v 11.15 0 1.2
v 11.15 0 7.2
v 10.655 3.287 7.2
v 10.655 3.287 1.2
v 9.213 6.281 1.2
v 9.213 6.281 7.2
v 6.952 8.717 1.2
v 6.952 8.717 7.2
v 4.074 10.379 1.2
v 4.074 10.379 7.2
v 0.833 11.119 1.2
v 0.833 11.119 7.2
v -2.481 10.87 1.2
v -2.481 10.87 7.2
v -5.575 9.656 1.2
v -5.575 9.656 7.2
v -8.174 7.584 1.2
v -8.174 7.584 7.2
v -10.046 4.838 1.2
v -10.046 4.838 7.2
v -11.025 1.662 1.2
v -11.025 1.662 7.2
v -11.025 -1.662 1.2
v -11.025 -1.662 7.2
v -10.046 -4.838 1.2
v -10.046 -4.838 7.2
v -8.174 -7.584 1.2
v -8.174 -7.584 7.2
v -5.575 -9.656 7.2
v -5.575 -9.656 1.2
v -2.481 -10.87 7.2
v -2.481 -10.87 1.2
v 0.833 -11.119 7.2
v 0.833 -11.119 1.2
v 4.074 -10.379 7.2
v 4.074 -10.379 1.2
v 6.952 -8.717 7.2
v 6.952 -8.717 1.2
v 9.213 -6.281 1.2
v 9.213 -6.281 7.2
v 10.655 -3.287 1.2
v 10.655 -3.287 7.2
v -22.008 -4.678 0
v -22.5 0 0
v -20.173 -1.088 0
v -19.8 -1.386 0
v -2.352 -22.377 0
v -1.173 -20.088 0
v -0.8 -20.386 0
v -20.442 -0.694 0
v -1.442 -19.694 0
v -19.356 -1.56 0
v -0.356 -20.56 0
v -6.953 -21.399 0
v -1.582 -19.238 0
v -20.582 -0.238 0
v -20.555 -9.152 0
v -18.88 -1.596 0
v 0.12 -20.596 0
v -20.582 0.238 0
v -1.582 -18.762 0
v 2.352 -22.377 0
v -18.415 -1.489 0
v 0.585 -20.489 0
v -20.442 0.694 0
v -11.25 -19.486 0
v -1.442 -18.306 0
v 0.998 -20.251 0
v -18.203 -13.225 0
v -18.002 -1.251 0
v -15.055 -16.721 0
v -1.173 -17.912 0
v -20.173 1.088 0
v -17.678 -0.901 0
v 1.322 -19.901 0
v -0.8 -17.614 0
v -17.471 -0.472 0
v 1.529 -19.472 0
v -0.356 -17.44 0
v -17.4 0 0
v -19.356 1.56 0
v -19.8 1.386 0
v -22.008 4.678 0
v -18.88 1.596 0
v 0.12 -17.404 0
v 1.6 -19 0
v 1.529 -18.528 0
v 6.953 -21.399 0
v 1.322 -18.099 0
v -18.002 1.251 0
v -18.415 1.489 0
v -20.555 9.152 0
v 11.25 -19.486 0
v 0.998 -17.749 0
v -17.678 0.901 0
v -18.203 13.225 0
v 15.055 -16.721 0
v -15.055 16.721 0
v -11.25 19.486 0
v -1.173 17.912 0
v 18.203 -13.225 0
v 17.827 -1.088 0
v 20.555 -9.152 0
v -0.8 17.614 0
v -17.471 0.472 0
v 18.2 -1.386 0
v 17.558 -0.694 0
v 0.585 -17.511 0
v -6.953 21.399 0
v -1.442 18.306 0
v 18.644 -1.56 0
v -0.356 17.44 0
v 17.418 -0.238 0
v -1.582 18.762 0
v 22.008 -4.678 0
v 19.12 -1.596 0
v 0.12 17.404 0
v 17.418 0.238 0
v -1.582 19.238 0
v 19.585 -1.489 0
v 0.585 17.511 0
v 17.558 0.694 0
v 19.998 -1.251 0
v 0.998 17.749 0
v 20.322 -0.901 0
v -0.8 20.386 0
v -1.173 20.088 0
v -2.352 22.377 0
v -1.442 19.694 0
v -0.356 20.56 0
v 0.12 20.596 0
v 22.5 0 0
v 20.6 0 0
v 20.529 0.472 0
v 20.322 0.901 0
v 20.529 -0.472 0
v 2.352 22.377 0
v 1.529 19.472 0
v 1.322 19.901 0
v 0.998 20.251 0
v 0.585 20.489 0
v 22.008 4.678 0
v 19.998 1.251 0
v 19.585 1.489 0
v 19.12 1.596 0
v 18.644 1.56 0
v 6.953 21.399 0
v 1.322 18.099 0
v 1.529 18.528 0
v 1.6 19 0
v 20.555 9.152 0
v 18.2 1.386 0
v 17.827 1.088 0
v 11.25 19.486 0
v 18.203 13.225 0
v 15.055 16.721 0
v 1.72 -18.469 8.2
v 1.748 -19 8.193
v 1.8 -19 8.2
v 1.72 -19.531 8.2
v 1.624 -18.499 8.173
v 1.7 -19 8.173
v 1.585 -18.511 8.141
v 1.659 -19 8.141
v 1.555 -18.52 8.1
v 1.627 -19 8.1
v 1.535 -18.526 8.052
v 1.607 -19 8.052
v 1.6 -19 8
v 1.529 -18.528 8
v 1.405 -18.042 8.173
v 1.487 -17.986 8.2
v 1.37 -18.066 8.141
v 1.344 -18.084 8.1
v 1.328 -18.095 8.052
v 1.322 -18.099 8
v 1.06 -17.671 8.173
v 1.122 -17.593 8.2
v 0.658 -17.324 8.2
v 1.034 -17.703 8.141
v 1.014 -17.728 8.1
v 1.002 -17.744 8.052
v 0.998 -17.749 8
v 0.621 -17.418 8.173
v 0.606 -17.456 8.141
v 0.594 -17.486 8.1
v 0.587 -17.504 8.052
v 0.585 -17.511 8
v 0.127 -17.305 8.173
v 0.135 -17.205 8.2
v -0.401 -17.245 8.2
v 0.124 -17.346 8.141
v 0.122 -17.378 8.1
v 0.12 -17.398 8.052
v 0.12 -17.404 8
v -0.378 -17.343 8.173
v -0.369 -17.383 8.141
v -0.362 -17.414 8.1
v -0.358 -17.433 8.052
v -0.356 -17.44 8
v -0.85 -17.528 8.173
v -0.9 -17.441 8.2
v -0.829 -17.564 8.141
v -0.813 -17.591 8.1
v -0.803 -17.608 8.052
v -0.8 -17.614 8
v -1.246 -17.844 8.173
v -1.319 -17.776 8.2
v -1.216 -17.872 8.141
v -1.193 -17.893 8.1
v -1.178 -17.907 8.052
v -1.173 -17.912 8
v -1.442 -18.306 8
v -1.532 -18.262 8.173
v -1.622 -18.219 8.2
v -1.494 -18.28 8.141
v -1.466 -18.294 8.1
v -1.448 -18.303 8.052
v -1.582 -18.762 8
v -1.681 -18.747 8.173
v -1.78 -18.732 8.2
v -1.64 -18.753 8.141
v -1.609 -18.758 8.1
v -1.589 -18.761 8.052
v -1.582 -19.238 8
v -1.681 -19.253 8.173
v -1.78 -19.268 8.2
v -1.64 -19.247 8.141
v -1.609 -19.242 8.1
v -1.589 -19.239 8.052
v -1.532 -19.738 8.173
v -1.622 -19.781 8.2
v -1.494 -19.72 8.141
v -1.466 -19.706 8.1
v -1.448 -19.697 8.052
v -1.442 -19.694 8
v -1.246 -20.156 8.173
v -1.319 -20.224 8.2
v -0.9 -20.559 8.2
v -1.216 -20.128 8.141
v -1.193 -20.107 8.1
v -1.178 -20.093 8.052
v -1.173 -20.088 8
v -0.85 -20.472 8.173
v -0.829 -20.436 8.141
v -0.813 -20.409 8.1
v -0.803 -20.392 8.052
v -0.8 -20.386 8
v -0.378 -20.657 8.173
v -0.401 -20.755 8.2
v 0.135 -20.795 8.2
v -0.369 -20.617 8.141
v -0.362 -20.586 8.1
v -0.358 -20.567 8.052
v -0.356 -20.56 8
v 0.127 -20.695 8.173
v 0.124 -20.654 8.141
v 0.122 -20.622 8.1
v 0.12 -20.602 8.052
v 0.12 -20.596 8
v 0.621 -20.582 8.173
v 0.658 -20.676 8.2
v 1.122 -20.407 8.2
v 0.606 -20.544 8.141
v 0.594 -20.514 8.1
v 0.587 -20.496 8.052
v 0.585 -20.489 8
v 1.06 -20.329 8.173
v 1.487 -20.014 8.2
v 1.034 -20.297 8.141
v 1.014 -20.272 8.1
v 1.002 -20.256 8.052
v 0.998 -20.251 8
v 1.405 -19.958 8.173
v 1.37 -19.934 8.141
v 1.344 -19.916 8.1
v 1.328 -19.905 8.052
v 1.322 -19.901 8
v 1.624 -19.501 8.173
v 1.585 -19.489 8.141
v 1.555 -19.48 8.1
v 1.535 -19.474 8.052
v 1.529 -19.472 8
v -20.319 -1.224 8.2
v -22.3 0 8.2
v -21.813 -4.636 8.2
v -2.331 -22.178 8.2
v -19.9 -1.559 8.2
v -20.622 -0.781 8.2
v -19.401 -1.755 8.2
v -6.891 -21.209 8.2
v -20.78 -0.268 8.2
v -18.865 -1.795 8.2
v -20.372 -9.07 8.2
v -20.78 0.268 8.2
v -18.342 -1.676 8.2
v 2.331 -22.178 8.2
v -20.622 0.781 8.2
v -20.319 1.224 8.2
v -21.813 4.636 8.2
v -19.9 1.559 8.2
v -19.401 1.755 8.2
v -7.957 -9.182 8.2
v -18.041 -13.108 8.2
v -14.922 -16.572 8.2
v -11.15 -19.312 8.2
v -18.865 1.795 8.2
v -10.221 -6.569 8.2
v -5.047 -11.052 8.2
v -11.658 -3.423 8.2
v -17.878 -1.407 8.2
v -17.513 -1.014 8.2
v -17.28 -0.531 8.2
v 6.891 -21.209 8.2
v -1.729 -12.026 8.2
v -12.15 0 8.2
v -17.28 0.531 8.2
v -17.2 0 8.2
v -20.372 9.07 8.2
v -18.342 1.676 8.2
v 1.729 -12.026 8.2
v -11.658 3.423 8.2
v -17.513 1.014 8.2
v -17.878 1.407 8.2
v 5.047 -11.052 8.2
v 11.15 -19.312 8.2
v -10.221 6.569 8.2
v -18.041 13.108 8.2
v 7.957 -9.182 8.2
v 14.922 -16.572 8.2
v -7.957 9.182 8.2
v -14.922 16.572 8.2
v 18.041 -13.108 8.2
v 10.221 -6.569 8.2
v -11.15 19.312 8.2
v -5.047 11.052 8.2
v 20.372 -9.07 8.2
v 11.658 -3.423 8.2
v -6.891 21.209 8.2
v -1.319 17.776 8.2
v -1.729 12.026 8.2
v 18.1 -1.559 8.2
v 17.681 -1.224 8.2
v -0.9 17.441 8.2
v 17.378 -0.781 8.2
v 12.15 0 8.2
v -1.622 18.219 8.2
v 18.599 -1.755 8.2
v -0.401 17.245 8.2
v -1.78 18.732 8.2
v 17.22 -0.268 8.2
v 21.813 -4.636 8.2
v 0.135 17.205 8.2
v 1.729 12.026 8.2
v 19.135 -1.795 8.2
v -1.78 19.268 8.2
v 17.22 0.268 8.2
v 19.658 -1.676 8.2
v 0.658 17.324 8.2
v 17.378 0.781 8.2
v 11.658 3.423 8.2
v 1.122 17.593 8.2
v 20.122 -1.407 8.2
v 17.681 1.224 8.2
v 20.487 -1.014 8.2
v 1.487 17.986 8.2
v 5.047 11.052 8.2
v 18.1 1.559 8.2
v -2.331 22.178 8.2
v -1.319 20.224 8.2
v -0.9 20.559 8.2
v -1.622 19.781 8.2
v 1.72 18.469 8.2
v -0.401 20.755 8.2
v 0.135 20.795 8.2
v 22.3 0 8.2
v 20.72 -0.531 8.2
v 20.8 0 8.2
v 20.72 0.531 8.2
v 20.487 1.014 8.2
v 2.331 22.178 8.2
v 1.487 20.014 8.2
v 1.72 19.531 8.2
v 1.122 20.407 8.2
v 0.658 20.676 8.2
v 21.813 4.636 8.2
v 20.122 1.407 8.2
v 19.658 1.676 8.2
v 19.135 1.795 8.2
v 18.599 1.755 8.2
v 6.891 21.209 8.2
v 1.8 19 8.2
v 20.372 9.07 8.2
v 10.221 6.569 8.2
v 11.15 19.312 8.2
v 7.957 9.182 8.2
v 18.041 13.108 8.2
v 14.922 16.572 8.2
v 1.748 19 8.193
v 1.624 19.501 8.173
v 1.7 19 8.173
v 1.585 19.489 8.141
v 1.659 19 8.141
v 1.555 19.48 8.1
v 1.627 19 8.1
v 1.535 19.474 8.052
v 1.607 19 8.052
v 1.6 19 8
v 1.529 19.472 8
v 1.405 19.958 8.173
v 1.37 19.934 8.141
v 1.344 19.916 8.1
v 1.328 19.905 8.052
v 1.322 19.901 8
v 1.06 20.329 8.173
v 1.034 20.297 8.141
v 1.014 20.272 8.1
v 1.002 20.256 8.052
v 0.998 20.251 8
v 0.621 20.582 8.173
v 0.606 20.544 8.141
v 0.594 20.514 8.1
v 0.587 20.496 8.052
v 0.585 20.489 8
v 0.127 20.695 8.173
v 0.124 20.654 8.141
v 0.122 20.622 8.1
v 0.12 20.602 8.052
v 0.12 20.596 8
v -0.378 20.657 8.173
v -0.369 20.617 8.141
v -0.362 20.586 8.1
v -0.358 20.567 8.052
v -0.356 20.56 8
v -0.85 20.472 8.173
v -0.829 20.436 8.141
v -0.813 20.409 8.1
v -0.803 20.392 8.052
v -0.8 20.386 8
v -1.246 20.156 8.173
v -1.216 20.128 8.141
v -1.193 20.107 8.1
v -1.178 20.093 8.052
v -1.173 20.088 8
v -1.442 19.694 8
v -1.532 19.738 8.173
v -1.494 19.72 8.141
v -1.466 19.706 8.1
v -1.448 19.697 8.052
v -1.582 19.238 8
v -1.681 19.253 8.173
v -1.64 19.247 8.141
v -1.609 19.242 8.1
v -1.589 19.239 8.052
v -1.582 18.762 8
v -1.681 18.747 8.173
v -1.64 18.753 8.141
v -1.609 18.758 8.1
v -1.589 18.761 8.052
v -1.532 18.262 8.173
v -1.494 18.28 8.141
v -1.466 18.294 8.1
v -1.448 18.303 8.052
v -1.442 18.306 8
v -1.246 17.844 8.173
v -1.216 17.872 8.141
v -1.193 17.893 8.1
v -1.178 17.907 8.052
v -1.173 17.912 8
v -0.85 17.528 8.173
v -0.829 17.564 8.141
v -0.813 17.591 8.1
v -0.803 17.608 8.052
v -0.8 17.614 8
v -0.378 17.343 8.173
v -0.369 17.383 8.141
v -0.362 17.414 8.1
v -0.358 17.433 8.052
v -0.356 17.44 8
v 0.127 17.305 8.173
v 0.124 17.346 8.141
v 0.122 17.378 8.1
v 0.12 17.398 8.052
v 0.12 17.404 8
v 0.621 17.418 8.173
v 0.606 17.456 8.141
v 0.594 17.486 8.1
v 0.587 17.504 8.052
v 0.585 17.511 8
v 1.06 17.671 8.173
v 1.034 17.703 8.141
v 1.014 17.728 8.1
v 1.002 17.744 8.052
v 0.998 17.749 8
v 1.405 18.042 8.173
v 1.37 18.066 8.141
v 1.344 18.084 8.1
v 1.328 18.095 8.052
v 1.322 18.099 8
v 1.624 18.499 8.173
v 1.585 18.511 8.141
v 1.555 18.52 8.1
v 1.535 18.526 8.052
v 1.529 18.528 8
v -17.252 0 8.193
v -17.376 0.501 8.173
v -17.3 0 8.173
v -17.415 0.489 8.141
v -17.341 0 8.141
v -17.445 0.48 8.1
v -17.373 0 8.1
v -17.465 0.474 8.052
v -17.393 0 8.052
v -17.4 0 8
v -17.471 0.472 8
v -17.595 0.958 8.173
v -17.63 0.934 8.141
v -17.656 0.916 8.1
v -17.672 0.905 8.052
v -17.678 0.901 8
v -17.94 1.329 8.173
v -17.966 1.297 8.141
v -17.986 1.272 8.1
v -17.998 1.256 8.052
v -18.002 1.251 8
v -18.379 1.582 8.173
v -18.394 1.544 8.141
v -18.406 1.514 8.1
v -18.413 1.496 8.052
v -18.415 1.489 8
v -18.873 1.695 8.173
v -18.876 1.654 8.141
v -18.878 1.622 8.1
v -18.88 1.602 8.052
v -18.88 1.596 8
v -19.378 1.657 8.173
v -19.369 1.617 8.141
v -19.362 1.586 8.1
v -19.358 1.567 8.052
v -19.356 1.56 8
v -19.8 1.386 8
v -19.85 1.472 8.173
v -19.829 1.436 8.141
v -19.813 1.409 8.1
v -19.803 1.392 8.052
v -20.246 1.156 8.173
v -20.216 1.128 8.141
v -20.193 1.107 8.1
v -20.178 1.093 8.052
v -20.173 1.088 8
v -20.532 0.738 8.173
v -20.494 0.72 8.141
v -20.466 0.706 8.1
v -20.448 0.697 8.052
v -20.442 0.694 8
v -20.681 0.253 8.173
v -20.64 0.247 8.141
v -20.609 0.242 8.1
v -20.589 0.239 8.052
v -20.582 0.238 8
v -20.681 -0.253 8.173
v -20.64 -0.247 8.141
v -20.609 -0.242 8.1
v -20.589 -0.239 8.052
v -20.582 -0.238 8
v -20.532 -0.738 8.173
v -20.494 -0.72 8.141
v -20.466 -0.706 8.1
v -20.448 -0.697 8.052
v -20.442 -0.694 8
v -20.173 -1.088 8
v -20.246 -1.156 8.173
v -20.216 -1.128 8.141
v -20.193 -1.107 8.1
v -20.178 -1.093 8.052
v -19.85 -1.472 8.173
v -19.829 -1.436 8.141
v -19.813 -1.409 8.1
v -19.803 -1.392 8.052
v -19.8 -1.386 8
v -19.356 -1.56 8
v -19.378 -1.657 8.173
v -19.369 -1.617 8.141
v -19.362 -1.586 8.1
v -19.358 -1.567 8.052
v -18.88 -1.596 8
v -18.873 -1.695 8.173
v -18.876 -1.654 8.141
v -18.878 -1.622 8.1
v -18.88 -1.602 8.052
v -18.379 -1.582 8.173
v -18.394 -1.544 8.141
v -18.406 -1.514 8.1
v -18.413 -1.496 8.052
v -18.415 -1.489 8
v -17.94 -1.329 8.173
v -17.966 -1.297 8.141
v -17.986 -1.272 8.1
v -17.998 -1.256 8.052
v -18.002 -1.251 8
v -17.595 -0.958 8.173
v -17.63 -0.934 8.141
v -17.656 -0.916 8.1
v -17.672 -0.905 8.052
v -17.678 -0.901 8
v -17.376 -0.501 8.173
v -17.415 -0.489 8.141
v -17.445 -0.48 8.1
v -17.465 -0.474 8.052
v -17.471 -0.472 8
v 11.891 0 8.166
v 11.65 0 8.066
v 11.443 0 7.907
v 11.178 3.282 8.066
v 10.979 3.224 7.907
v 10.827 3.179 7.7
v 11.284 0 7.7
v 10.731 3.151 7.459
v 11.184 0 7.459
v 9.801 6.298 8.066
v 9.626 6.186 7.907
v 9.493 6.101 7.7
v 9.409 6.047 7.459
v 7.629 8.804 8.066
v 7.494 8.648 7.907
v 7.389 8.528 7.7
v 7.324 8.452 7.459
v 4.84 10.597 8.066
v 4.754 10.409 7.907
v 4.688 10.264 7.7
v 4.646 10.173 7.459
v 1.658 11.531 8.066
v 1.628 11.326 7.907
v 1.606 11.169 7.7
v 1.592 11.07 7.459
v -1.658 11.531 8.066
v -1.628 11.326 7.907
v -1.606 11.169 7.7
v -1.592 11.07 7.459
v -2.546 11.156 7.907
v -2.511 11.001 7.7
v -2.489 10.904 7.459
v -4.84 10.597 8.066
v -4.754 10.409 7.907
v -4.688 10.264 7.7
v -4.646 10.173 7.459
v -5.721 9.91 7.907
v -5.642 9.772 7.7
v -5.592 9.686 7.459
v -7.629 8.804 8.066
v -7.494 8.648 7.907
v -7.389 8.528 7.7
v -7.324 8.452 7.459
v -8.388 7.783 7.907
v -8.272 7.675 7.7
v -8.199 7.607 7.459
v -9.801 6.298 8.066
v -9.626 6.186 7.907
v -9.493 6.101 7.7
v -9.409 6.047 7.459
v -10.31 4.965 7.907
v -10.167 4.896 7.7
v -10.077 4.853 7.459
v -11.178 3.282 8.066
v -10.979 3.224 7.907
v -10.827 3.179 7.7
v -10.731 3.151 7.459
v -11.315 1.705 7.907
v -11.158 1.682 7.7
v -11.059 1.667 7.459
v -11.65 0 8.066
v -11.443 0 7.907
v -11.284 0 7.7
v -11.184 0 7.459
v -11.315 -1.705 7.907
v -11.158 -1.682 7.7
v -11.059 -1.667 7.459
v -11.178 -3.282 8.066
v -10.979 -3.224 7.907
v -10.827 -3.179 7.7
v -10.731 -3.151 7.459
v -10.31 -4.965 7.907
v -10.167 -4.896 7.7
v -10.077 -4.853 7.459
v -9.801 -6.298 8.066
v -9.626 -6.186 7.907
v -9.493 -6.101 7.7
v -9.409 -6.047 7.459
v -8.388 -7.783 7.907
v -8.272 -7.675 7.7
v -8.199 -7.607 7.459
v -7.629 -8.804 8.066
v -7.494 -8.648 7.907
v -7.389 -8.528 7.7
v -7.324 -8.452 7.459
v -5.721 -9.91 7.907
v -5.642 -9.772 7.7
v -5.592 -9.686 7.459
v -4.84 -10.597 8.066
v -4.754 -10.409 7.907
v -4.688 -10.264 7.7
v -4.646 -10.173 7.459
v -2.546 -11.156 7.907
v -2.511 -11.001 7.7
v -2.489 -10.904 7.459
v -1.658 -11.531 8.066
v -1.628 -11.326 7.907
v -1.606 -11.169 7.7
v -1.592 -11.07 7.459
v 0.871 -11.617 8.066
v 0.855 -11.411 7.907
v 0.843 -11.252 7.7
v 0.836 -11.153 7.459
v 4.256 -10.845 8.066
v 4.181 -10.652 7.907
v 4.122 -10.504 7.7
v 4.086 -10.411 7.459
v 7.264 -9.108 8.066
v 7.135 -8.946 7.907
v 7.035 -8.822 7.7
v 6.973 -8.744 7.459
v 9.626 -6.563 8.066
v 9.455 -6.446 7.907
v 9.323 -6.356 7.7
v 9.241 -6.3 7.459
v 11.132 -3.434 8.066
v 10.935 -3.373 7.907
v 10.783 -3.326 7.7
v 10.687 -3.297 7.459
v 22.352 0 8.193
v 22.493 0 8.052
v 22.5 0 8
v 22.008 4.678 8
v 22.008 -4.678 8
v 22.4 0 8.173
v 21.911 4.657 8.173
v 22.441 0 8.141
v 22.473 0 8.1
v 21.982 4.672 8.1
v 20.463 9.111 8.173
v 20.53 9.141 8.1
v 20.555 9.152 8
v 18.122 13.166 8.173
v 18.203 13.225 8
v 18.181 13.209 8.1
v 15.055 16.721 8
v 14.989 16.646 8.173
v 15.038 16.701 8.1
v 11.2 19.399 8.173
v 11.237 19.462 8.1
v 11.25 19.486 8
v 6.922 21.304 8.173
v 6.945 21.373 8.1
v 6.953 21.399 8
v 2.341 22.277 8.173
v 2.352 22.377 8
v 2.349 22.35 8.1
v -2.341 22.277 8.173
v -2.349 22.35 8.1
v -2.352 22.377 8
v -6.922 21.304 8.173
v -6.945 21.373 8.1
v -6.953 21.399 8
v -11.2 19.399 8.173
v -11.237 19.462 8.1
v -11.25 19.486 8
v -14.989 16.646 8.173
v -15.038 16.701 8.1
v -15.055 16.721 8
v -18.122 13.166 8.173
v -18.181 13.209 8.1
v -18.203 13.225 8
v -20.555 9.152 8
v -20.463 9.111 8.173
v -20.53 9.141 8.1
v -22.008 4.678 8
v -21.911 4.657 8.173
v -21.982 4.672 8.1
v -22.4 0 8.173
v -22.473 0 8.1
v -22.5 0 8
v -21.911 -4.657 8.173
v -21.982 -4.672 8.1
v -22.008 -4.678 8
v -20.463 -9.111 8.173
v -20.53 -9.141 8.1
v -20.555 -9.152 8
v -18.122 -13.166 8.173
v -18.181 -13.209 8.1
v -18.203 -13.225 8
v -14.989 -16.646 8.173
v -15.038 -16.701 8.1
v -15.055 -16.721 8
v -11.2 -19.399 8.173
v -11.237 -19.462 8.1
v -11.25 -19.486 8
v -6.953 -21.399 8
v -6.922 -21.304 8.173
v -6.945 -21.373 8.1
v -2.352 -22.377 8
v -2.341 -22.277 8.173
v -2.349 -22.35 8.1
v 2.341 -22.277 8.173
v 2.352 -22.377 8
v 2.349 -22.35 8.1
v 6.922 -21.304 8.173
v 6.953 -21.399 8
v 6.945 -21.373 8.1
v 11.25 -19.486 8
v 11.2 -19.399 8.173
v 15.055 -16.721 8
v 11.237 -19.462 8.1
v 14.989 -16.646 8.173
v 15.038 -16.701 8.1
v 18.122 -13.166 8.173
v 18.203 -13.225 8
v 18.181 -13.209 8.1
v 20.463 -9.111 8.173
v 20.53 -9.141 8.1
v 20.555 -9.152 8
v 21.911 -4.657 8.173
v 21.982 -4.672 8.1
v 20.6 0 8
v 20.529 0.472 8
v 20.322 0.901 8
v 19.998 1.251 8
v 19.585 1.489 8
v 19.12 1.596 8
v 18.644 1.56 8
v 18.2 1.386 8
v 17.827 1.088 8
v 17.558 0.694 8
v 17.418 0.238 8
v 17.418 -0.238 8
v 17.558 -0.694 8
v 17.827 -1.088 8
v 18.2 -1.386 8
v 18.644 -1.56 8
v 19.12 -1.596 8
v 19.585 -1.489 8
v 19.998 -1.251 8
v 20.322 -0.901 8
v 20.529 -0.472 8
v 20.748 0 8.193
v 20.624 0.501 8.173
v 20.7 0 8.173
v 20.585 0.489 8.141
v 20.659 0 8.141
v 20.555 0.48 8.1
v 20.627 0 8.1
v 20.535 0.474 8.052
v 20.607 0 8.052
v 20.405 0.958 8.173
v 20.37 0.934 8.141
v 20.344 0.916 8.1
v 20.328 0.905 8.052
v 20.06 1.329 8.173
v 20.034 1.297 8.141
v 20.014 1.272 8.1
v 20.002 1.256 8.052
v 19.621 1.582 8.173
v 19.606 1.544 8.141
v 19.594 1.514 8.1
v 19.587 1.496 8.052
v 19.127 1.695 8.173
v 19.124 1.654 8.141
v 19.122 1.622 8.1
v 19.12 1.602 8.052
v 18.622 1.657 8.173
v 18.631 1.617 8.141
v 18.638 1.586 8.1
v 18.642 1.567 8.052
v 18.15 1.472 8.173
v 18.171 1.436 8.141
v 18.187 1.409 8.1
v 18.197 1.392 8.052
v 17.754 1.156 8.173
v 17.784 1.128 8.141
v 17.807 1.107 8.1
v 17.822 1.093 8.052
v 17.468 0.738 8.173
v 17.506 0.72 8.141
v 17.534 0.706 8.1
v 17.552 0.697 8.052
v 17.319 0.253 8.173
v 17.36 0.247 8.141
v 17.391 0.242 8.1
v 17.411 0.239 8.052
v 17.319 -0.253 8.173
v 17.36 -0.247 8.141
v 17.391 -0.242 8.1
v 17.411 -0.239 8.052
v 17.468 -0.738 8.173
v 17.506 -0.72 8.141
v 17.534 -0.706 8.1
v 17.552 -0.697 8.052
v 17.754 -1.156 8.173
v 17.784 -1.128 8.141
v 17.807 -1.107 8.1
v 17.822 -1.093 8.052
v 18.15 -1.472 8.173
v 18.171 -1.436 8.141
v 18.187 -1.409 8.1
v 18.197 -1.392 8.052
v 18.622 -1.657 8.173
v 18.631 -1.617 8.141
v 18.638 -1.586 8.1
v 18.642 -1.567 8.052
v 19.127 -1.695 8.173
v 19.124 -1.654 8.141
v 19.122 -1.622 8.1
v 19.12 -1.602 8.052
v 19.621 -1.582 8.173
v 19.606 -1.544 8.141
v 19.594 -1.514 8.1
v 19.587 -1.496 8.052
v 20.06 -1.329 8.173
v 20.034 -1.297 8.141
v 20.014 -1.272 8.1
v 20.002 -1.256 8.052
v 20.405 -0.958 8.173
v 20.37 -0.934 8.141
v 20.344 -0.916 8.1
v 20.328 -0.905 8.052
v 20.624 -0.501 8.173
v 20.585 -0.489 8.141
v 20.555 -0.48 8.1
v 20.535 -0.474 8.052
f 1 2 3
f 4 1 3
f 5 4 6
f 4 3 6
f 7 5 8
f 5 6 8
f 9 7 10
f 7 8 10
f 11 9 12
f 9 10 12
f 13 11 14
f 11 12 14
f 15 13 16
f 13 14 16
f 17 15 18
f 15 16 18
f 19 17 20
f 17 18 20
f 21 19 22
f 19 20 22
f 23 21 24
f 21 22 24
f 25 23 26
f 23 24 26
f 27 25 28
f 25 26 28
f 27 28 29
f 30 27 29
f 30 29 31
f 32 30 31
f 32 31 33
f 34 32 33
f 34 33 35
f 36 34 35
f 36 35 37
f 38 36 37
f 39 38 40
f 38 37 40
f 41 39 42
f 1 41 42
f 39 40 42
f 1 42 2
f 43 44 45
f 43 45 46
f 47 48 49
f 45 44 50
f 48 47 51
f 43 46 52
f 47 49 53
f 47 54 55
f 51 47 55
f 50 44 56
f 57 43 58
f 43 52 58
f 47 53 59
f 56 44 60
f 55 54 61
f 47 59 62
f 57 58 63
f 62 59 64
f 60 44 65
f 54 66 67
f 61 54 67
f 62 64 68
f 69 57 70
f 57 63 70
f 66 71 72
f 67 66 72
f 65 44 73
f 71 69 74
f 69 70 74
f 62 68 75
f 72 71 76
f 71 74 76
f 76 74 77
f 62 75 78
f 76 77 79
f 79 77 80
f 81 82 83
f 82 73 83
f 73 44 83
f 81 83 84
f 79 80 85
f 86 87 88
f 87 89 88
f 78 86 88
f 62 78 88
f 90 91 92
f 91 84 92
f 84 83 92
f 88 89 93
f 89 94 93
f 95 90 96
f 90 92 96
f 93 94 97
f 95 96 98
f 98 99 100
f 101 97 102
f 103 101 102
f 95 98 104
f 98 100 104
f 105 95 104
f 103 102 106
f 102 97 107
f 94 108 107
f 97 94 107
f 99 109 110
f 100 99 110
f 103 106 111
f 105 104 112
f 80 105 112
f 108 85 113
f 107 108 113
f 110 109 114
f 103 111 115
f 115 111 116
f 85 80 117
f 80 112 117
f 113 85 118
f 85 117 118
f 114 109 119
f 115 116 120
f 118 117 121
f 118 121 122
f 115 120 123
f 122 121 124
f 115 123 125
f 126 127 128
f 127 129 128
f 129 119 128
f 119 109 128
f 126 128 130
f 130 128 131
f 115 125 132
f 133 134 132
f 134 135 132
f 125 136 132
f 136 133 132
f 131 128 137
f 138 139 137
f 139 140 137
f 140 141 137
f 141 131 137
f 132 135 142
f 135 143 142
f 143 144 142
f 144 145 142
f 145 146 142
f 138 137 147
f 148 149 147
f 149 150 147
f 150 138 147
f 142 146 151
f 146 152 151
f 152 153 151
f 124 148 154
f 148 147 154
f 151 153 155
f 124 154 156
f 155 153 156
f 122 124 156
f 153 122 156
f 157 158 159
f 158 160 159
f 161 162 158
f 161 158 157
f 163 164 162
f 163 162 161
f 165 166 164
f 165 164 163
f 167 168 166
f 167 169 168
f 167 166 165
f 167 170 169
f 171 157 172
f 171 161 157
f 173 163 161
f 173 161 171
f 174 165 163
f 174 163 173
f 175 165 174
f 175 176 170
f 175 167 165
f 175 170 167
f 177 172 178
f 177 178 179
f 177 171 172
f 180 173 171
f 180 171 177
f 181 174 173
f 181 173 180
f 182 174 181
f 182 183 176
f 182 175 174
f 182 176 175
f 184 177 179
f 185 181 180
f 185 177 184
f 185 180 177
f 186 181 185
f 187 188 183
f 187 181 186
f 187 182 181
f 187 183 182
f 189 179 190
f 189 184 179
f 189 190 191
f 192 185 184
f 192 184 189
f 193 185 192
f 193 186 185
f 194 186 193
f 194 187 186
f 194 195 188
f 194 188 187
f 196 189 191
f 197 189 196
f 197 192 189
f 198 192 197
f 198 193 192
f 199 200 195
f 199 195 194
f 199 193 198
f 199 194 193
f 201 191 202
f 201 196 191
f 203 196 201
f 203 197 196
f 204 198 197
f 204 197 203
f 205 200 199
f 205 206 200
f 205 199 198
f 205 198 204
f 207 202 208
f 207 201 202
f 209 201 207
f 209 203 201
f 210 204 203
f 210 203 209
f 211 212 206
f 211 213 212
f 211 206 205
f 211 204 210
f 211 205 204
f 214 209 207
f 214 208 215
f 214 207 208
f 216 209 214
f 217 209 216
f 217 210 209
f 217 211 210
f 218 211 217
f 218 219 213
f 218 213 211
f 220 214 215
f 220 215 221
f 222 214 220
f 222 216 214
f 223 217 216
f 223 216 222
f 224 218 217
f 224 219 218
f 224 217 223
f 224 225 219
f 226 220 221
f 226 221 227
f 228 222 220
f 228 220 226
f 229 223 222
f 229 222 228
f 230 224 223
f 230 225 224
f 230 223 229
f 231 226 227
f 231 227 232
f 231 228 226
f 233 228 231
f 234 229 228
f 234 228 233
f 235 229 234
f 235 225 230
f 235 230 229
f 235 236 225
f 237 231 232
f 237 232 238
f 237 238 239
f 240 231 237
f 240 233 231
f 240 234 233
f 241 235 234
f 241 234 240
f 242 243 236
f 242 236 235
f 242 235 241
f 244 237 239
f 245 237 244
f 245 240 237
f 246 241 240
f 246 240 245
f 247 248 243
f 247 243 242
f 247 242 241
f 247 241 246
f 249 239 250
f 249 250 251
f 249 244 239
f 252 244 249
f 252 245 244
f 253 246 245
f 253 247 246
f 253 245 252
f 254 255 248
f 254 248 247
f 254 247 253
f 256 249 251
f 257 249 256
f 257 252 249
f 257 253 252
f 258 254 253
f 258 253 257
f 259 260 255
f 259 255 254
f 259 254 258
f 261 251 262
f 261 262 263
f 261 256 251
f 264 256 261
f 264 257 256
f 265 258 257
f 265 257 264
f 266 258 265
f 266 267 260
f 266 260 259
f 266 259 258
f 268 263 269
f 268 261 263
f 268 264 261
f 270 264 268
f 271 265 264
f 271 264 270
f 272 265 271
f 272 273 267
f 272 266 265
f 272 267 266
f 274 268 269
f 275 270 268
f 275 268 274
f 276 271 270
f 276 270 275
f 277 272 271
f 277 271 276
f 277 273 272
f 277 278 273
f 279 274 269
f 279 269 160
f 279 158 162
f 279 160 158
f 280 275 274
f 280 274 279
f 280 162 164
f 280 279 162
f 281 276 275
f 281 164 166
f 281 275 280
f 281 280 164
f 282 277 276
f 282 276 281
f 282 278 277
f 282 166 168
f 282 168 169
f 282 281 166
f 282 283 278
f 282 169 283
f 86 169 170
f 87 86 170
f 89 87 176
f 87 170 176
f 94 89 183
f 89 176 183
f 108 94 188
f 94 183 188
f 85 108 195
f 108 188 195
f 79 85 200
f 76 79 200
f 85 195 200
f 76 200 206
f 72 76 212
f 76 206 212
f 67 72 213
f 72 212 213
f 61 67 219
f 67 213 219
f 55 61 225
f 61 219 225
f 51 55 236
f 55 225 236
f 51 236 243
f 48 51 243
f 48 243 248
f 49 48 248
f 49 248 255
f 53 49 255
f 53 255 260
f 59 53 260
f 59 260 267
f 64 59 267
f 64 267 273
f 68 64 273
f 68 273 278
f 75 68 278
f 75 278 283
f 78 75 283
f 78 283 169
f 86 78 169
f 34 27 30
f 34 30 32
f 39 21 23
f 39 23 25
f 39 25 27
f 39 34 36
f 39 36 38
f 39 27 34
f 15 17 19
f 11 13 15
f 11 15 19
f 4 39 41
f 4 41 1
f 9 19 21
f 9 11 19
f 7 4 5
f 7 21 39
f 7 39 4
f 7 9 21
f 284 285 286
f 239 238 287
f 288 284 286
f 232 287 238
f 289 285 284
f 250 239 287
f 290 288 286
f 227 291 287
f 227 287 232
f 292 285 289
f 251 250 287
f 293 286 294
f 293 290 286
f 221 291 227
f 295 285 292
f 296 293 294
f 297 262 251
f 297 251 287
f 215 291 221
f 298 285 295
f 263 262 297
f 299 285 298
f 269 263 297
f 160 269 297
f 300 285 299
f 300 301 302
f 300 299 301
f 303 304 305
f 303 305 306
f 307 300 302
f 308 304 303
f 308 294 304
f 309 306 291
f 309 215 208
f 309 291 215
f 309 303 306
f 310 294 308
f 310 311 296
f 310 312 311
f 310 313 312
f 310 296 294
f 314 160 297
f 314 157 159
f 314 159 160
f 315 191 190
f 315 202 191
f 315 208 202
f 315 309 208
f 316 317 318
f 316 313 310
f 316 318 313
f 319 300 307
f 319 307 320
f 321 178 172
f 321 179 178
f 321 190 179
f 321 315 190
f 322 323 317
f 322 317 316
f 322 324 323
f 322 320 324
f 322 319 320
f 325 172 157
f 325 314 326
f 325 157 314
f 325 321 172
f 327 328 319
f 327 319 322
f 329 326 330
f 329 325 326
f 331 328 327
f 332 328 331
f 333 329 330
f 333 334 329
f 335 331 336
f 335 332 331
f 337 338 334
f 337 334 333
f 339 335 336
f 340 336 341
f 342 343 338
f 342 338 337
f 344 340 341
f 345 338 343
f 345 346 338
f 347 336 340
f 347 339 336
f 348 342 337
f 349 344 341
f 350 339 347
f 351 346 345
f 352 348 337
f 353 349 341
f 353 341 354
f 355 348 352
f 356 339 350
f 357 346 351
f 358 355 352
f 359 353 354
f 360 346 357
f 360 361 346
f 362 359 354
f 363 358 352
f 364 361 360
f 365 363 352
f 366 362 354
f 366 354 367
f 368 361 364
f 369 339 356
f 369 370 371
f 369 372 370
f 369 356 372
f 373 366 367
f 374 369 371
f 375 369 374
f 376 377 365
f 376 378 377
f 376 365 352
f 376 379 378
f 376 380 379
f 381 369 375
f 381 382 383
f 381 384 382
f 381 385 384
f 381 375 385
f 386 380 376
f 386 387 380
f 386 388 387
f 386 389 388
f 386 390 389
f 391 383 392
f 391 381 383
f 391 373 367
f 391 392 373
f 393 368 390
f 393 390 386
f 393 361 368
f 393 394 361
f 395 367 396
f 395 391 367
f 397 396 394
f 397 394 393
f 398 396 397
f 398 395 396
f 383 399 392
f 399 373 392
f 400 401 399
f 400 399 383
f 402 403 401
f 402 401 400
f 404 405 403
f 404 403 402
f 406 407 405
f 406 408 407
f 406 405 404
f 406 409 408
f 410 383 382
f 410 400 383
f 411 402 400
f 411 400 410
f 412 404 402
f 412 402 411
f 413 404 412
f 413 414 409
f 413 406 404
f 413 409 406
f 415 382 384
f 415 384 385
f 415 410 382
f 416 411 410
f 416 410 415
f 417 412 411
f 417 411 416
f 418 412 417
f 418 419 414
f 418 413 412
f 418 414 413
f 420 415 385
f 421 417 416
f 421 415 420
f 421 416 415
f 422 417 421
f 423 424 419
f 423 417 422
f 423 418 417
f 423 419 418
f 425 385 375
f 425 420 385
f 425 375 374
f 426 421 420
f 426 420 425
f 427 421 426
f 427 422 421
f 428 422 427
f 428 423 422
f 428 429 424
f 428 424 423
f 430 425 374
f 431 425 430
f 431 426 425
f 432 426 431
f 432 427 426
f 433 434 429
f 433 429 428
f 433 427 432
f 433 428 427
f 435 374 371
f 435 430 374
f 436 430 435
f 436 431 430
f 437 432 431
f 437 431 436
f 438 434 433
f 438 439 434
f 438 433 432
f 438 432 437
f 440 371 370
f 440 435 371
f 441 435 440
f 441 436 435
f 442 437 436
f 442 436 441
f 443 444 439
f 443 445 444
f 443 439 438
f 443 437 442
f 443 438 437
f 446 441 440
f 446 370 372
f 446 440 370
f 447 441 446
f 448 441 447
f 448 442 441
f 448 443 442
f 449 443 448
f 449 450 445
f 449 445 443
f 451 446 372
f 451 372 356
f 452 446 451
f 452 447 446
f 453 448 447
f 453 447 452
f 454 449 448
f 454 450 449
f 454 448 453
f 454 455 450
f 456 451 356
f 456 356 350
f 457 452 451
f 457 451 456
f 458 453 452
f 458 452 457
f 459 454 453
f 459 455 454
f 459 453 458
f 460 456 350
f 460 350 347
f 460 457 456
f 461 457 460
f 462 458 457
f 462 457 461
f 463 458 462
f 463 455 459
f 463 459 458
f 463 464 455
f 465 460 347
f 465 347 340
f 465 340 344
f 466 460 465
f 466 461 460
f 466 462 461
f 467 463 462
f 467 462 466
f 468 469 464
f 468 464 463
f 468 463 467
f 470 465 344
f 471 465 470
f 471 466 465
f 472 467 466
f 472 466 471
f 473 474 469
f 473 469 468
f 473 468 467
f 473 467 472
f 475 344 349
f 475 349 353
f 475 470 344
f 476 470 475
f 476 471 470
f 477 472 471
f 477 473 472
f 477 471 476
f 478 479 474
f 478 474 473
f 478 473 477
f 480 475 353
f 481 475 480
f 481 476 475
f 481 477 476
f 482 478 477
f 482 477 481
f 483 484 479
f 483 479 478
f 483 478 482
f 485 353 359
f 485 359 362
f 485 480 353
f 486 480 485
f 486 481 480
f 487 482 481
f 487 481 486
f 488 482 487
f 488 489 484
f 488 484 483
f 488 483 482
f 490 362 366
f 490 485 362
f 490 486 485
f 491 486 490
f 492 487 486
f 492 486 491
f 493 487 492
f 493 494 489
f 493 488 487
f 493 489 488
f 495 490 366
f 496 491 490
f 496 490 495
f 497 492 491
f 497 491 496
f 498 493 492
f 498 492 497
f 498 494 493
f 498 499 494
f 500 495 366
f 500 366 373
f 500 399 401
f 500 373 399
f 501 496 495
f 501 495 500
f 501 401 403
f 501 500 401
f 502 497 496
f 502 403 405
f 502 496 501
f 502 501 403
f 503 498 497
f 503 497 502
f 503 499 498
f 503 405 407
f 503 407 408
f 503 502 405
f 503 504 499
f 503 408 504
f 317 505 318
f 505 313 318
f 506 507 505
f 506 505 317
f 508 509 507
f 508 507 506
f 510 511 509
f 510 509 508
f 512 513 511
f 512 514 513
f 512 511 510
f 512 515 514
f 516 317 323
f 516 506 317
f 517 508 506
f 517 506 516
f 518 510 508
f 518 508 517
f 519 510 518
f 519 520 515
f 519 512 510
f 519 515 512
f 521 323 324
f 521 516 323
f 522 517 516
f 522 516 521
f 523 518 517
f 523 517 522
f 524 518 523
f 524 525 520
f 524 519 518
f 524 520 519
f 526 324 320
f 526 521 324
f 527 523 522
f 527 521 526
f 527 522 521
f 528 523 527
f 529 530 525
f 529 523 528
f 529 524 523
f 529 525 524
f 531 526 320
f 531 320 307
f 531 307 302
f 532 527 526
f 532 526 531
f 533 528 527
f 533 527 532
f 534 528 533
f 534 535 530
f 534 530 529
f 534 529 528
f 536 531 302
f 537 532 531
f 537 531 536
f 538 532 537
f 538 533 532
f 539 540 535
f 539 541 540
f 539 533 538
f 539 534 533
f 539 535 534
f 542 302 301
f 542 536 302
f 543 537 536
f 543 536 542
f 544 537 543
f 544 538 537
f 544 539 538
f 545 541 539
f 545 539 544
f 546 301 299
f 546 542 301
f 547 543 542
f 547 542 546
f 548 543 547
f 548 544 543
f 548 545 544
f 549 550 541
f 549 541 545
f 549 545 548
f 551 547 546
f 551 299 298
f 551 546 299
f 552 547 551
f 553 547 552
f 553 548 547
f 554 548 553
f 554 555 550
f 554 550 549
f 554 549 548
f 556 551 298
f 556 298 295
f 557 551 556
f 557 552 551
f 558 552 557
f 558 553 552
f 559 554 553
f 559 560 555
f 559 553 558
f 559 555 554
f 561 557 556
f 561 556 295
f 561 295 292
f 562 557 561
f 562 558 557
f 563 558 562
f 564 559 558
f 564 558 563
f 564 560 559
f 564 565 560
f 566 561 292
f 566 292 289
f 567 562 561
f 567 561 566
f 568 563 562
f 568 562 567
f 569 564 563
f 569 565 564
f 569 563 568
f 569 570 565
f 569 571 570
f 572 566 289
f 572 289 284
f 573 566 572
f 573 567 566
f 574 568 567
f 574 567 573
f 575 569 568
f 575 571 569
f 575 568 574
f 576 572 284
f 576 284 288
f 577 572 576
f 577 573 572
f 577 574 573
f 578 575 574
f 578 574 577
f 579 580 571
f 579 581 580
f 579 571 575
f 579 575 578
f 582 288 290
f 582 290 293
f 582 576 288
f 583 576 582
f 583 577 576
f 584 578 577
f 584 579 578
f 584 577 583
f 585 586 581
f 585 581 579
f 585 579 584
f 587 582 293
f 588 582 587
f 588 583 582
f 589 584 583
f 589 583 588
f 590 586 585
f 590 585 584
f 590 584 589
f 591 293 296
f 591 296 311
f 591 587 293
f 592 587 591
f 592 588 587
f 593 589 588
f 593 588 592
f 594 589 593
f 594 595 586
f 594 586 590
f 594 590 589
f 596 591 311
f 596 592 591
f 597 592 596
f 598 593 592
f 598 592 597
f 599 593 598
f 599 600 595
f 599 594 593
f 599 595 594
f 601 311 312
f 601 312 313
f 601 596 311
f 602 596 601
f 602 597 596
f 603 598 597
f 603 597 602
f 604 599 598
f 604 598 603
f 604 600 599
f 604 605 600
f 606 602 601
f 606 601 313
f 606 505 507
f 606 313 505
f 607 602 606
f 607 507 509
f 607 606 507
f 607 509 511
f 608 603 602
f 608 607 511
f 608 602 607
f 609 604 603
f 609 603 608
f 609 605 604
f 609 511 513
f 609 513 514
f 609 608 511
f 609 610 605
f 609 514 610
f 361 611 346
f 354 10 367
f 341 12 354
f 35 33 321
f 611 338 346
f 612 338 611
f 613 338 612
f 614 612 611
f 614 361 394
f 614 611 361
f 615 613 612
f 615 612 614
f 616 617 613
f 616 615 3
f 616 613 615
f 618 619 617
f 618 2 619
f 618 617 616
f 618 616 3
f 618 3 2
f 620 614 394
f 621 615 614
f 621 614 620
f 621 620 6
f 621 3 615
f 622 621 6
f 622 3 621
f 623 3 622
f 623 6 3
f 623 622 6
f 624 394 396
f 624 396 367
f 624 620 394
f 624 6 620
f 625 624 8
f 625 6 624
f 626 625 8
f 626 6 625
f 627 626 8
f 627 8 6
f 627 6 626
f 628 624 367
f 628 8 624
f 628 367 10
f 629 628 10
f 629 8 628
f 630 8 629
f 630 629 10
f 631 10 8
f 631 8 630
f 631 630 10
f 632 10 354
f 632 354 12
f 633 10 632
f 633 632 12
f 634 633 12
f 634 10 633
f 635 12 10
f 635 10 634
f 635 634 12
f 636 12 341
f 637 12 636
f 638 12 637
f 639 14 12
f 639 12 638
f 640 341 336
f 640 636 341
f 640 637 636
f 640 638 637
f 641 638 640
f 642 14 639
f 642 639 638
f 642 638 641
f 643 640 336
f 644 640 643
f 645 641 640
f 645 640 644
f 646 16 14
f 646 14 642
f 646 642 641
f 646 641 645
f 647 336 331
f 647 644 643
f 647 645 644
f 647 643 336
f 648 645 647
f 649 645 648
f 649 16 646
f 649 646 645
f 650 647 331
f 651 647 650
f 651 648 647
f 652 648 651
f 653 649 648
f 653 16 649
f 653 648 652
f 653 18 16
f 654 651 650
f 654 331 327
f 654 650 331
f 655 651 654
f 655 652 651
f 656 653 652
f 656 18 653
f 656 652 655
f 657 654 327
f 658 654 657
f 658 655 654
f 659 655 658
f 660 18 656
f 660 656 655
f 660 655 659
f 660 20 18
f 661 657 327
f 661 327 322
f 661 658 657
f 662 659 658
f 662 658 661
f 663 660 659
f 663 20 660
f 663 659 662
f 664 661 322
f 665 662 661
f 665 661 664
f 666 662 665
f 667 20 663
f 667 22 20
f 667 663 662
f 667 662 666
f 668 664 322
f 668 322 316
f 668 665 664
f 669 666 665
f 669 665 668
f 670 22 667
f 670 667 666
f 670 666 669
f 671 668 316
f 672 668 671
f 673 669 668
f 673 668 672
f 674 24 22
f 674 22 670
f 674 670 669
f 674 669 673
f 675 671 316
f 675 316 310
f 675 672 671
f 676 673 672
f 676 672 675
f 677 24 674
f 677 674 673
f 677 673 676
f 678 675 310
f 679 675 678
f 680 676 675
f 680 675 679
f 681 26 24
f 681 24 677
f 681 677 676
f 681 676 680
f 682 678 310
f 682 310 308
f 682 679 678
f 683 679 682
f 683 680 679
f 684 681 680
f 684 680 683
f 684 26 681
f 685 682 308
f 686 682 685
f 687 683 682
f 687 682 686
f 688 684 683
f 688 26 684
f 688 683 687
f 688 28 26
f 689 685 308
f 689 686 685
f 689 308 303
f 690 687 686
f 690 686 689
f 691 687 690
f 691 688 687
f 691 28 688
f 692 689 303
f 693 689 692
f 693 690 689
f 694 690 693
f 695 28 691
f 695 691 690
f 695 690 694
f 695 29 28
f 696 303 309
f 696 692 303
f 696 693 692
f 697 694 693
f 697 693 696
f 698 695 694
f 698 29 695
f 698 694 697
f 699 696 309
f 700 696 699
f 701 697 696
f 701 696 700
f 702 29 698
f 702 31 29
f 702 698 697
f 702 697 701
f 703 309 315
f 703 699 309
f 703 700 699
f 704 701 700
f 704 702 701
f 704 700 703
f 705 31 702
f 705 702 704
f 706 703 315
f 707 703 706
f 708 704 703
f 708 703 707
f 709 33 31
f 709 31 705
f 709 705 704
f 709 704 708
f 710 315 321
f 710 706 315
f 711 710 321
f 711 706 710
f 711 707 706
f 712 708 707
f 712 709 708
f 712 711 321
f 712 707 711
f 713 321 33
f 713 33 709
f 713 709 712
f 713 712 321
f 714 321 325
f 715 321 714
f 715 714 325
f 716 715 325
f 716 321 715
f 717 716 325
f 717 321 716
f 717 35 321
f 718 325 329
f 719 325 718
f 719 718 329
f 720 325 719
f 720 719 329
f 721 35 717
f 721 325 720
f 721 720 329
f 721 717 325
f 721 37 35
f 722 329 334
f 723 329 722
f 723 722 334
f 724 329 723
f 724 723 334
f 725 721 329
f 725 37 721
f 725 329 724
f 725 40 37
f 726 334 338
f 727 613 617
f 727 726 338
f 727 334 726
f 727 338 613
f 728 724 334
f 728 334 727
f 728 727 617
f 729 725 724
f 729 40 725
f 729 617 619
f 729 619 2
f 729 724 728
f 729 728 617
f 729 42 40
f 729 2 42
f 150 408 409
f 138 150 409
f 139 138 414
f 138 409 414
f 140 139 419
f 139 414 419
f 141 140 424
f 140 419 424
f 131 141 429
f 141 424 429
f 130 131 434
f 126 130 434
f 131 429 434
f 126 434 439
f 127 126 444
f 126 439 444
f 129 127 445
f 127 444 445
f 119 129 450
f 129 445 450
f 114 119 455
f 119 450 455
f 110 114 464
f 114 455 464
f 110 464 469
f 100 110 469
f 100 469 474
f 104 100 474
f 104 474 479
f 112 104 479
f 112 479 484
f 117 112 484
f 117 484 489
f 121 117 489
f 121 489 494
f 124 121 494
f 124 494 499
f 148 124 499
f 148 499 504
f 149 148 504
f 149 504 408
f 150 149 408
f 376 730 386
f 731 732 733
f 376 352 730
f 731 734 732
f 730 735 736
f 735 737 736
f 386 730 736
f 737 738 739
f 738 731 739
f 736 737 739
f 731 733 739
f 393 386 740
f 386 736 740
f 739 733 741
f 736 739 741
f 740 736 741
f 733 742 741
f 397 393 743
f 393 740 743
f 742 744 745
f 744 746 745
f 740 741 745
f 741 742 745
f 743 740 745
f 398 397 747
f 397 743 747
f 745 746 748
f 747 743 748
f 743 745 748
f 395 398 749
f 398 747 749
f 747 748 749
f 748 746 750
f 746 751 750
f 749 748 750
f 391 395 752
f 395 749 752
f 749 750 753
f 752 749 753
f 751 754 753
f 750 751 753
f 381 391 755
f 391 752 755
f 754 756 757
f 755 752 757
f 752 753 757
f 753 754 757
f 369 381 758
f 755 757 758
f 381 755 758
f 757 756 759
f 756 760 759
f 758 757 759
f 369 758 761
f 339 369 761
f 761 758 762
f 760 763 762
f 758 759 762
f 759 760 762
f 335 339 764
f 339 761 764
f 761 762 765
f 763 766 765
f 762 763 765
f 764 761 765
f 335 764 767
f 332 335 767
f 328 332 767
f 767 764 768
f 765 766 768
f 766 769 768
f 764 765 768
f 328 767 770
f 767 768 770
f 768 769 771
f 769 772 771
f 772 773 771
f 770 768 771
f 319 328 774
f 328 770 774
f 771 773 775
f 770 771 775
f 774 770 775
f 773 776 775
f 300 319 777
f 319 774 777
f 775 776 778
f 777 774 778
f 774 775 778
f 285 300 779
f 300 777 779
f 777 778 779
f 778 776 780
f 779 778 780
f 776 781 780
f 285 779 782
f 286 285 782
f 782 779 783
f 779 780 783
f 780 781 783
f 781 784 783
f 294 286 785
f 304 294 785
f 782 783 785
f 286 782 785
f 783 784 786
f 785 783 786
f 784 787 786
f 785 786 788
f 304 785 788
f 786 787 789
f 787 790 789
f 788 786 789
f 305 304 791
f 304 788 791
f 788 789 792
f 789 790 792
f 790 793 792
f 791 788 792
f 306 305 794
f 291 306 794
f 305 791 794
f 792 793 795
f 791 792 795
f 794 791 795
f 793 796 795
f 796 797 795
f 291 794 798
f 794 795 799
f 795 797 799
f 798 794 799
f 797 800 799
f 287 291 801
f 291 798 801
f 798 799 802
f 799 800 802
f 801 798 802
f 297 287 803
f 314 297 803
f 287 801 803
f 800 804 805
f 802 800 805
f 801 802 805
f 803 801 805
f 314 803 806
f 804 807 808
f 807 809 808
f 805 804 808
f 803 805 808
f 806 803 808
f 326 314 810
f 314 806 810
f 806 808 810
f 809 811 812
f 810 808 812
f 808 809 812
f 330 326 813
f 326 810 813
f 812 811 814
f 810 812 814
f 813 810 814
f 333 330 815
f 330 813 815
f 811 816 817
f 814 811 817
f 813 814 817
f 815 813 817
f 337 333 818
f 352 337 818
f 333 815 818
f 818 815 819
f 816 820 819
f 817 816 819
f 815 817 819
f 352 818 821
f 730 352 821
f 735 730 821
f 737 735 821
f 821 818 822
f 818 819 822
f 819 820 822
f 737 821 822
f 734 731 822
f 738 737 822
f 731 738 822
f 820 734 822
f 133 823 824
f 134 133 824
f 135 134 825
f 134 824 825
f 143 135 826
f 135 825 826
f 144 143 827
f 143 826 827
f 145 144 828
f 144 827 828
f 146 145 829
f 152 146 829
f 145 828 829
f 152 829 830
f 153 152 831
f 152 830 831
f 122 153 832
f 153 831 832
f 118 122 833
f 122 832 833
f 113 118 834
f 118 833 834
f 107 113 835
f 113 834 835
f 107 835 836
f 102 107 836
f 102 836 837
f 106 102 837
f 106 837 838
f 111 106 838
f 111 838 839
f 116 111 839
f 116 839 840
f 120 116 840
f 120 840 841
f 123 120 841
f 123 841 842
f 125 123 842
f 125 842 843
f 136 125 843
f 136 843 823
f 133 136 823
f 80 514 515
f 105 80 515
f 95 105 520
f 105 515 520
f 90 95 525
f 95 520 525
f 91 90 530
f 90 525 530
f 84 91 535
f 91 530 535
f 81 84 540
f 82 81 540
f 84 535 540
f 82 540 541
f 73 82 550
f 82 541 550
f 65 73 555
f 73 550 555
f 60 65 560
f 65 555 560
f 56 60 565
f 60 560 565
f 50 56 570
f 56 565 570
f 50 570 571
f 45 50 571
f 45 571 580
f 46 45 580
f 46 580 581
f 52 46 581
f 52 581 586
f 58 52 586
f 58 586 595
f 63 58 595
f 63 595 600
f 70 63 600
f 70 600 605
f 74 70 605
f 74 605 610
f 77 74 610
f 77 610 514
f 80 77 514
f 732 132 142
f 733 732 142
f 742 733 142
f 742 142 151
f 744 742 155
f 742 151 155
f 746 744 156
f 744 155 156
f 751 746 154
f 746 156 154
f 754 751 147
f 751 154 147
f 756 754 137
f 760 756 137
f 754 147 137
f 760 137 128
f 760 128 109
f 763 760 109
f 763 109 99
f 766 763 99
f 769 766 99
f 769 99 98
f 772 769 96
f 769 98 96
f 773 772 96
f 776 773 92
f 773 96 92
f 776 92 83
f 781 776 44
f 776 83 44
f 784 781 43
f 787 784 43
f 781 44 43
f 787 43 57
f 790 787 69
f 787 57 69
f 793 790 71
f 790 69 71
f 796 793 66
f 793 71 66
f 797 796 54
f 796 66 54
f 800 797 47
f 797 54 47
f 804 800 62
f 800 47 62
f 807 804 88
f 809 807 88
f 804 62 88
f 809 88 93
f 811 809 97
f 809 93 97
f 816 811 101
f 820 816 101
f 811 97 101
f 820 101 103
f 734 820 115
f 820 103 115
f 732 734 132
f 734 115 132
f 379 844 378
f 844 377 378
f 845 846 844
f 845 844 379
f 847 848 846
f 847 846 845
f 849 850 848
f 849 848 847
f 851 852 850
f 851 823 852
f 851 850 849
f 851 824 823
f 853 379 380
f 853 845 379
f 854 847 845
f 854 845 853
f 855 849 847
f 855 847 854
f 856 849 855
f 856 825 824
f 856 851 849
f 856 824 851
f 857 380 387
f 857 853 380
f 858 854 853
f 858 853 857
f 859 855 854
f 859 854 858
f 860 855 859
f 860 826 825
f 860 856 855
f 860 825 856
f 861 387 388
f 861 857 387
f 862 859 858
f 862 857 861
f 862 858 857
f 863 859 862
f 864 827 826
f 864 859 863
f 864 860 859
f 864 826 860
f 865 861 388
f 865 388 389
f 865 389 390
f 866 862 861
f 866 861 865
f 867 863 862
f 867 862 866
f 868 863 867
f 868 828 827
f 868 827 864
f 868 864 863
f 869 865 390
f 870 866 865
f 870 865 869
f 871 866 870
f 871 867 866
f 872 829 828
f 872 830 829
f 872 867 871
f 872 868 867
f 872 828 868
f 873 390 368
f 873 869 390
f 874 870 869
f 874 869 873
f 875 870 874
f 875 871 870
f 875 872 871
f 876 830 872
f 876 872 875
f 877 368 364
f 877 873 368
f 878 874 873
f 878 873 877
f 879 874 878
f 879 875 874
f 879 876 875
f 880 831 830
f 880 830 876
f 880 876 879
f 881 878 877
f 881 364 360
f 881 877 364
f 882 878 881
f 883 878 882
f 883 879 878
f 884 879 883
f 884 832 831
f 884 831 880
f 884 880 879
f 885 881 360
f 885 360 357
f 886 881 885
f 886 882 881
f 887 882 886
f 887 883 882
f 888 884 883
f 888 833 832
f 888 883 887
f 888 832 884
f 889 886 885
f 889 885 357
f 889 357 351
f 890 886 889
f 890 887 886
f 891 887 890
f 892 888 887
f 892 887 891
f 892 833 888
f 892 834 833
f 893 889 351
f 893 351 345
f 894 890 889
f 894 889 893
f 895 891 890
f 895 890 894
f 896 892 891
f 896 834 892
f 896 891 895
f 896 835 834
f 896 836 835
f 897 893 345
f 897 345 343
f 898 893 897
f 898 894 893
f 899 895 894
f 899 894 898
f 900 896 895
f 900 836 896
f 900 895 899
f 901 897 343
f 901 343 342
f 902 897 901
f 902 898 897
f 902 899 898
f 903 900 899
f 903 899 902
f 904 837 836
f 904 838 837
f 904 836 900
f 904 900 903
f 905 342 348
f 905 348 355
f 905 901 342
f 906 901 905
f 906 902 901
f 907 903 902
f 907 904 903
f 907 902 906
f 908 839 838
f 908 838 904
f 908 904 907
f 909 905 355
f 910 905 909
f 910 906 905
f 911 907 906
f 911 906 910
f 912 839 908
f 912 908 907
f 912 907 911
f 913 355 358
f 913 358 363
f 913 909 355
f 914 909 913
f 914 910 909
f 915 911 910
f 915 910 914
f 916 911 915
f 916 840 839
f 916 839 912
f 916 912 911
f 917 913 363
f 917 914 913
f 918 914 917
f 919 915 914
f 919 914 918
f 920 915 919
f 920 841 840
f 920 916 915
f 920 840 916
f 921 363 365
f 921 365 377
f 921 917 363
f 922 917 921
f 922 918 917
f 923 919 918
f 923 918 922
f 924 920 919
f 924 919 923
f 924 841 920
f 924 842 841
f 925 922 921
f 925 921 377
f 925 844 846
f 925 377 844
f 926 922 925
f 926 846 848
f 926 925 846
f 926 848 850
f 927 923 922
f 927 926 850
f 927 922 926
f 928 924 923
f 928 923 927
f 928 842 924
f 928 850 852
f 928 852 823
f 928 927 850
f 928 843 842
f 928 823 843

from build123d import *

# Parameters (mm, degrees)
SKETCH1_R           = 22.5
BOSS_EXTRUDE1_DEPTH = 8.2
SKETCH2_R           = 11.15
CUT_EXTRUDE1_DEPTH  = 7
SKETCH3_R           = 1.6
CUT_EXTRUDE2_DEPTH  = 33.859397438
FILLET1_R           = 1
FILLET2_R           = 0.2


with BuildPart() as part:
    # Sketch1 → Boss-Extrude1 (new body)
    with BuildSketch(Plane.XY):
        Circle(SKETCH1_R)
    extrude(amount=BOSS_EXTRUDE1_DEPTH)

    # Sketch2 → Cut-Extrude1 (cut)
    with BuildSketch(Plane.XY.offset(8.2)):
        Circle(SKETCH2_R)
    extrude(amount=-CUT_EXTRUDE1_DEPTH, mode=Mode.SUBTRACT)

    # Sketch3 → Cut-Extrude2 (cut, through all)
    with BuildSketch(Plane.XY.offset(8.2)):
        with Locations((-19, 0)):
            Circle(SKETCH3_R)
        with Locations((0, 19)):
            Circle(SKETCH3_R)
        with Locations((19, 0)):
            Circle(SKETCH3_R)
        with Locations((0, -19)):
            Circle(SKETCH3_R)
    extrude(amount=-CUT_EXTRUDE2_DEPTH, mode=Mode.SUBTRACT)

    # Fillet1
    fillet1_edges = [part.edges().sort_by_distance(p)[0] for p in [
        (-11.15, 0, 8.2),
    ]]
    fillet(fillet1_edges, radius=FILLET1_R)

    # Fillet2
    fillet2_edges = [part.edges().sort_by_distance(p)[0] for p in [
        (-20.6, 0, 8.2),
        (-1.6, 19, 8.2),
        (17.4, 0, 8.2),
        (-1.6, -19, 8.2),
        (-22.5, 0, 8.2),
    ]]
    fillet(fillet2_edges, radius=FILLET2_R)


solid = part.part
